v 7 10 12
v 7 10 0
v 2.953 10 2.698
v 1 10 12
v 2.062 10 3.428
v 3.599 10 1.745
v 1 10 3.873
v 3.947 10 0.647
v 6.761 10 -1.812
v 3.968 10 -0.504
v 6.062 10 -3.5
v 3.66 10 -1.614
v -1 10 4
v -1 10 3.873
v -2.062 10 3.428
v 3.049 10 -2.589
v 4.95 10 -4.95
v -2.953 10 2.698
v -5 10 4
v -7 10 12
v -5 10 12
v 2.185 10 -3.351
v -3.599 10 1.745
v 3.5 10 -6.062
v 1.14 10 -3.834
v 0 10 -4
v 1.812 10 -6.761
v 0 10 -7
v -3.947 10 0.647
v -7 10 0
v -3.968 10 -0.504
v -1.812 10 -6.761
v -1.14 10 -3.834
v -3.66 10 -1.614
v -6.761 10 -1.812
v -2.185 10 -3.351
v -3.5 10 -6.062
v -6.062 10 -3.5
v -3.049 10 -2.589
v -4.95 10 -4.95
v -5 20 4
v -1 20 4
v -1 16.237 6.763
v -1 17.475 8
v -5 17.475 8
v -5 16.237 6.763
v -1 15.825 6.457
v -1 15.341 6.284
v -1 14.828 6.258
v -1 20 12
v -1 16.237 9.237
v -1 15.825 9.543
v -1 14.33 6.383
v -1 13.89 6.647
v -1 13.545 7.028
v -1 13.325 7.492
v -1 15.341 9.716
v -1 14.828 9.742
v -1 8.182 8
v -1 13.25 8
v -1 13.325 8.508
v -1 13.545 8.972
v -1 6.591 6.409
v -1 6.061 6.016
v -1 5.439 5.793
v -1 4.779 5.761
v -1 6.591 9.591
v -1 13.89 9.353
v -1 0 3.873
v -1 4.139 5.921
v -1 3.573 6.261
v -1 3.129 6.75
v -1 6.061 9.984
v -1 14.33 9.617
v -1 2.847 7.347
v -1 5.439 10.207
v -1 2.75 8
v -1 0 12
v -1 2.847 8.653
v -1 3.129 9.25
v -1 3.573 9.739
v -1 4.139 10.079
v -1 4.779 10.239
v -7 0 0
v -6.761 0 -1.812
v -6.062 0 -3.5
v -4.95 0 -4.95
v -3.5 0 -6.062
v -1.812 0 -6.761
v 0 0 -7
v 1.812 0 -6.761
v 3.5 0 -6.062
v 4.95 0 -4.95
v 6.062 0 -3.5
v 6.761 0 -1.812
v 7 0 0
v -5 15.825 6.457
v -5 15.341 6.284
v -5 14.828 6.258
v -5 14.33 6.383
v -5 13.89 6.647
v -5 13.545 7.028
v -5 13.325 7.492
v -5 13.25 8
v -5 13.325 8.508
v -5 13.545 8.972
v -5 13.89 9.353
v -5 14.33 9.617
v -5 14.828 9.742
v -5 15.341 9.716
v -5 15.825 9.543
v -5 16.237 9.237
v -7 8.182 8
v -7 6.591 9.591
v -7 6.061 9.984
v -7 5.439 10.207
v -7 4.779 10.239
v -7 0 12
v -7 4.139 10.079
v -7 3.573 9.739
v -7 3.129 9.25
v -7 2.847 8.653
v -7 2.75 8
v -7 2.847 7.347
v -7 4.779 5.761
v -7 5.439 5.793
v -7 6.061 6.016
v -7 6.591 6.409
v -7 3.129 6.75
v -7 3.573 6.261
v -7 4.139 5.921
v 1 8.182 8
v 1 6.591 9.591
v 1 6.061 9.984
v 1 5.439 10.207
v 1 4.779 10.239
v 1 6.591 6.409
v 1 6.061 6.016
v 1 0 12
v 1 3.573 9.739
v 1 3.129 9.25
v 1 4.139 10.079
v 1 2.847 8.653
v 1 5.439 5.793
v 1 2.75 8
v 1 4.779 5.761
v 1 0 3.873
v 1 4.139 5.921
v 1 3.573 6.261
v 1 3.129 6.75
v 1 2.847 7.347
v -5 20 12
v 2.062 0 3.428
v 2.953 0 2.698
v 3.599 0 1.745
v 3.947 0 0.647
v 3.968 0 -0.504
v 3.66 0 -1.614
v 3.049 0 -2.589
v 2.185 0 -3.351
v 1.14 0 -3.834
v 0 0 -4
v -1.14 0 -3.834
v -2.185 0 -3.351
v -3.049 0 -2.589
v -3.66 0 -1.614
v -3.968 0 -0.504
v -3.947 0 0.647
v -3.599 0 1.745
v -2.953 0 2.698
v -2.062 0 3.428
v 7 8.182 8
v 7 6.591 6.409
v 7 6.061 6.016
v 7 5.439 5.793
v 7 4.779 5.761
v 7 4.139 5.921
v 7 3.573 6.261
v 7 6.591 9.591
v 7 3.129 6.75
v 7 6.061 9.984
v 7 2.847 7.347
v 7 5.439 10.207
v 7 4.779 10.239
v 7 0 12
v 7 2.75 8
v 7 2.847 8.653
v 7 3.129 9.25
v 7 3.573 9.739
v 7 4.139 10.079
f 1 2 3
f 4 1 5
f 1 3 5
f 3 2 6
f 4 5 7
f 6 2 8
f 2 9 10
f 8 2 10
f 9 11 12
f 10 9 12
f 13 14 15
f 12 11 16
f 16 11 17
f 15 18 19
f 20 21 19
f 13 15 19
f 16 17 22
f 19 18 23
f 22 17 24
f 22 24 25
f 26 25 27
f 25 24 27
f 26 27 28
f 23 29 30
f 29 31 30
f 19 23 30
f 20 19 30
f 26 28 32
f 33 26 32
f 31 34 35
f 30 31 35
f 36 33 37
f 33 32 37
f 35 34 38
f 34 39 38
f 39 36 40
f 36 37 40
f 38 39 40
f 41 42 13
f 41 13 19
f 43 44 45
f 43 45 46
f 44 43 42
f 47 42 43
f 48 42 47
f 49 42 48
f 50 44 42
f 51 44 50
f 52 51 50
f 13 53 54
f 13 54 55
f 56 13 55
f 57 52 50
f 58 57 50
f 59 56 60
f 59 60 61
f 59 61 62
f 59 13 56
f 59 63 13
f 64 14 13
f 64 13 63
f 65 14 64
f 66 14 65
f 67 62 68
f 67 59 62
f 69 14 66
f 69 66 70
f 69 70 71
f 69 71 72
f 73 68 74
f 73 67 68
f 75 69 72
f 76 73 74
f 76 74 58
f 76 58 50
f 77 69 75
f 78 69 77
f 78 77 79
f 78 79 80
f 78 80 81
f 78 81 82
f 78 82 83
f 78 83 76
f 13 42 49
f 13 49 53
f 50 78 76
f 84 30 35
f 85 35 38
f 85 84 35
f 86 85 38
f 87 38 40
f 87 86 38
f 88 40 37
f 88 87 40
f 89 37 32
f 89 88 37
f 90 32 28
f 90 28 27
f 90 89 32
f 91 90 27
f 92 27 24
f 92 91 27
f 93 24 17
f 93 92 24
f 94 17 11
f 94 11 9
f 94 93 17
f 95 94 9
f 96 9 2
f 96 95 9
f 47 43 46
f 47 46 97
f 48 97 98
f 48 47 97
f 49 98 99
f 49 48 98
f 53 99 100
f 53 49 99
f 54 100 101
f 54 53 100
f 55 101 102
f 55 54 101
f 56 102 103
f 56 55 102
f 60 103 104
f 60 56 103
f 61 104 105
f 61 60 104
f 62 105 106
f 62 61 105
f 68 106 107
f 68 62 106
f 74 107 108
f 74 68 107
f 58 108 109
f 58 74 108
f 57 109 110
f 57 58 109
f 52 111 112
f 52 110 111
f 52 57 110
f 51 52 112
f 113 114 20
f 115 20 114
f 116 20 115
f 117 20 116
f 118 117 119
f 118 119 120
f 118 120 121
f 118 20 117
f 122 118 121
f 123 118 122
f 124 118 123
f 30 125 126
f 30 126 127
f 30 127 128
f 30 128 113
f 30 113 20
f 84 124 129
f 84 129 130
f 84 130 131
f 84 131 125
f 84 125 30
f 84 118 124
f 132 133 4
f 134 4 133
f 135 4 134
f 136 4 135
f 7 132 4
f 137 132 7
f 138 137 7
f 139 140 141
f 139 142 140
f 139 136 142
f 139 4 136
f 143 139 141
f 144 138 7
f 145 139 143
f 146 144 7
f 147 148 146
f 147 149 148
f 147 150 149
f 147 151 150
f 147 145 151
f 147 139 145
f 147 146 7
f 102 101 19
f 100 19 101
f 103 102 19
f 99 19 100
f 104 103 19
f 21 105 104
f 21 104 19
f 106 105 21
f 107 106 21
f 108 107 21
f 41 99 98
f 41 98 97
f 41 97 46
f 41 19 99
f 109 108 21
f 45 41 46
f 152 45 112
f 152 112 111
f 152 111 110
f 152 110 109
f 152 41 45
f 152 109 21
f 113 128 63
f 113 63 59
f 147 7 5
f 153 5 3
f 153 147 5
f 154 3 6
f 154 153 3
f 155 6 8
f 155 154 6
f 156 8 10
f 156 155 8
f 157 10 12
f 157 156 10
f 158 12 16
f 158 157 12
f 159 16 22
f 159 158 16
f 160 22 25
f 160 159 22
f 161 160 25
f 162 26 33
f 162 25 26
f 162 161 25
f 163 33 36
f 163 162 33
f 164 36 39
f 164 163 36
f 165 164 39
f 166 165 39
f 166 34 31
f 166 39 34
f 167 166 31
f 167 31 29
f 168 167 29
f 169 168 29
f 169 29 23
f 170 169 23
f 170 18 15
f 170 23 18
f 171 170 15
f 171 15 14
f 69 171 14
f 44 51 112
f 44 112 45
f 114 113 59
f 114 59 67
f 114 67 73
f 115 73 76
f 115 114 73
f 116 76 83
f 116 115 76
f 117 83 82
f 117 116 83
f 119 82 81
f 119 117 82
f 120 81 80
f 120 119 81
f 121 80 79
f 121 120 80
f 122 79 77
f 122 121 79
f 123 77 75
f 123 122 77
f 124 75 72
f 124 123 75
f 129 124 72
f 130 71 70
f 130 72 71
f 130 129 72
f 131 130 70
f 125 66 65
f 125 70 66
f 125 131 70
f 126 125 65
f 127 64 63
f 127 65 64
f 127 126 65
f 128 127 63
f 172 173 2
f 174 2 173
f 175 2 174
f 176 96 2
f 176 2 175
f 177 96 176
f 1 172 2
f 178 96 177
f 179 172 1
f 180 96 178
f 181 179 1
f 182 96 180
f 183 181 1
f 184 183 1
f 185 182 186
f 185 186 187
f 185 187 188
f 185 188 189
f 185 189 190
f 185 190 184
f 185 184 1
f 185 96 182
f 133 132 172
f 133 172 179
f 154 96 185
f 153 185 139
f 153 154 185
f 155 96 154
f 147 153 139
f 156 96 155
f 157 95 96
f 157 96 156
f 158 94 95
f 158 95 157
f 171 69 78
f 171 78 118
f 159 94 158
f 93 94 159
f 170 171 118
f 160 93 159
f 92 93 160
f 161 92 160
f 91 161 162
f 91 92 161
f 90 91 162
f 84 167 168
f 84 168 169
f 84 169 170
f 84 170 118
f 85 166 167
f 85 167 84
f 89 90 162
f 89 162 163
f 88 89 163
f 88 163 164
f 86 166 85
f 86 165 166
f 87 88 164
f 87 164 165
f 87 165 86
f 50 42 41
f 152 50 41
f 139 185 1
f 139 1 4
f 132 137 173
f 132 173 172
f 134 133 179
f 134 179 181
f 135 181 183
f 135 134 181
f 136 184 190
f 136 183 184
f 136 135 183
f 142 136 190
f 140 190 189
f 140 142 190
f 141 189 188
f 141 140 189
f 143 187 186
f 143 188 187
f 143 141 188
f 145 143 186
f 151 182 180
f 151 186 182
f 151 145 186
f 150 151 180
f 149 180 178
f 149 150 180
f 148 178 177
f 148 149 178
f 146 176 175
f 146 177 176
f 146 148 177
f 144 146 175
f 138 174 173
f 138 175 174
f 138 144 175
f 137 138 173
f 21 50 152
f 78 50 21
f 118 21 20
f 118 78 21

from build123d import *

# Parameters (mm, degrees)
BOSS_EXTRUDE1_DEPTH = 20
CUT_EXTRUDE1_DEPTH  = 28.202941017
CUT_EXTRUDE2_DEPTH  = 10
CUT_EXTRUDE3_DEPTH  = 10
SKETCH5_W           = 8
SKETCH5_H           = 10
CUT_EXTRUDE4_DEPTH  = 2


with BuildPart() as part:
    # Sketch1 → Boss-Extrude1 (new body)
    with BuildSketch(Plane(origin=(0, 0, 0), x_dir=(1, 0, 0), z_dir=(0, 1, 0))):
        with BuildLine():
            Line((-7, -12), (-7, 0))
            ThreePointArc((-7, 0), (0, 7), (7, 0))
            Line((7, 0), (7, -12))
            Line((7, -12), (1, -12))
            Line((1, -12), (1, -3.872983346))
            ThreePointArc((1, -3.872983346), (0, 4), (-1, -3.872983346))
            Line((-1, -3.872983346), (-1, -12))
            Line((-1, -12), (-7, -12))
        make_face()
    extrude(amount=BOSS_EXTRUDE1_DEPTH)

    # Sketch2 → Cut-Extrude1 (cut, through all)
    with BuildSketch(Plane.ZY.offset(7)):
        with BuildLine():
            Line((6.409009742, 6.590990258), (8, 8.181980515))
            Line((8, 8.181980515), (9.590990258, 6.590990258))
            ThreePointArc((9.590990258, 6.590990258), (8, 2.75), (6.409009742, 6.590990258))
        make_face()
    extrude(amount=-CUT_EXTRUDE1_DEPTH, mode=Mode.SUBTRACT)

    # Sketch3 → Cut-Extrude2 (cut)
    with BuildSketch(Plane(origin=(0, 20, 0), x_dir=(1, 0, 0), z_dir=(0, 1, 0))):
        Polygon((1, -4), (-7, -4), (-7, 7), (7, 7), (7, 0), (7, -12), (1, -12), align=None)
    extrude(amount=-CUT_EXTRUDE2_DEPTH, mode=Mode.SUBTRACT)

    # Sketch4 → Cut-Extrude3 (cut)
    with BuildSketch(Plane(origin=(-1, 0, 0), x_dir=(0, 0, -1), z_dir=(1, 0, 0))):
        with BuildLine():
            Line((-9.237436867, 16.237436867), (-8, 17.474873734))
            Line((-8, 17.474873734), (-6.762563133, 16.237436867))
            ThreePointArc((-6.762563133, 16.237436867), (-8, 13.25), (-9.237436867, 16.237436867))
        make_face()
    extrude(amount=-CUT_EXTRUDE3_DEPTH, mode=Mode.SUBTRACT)

    # Sketch5 → Cut-Extrude4 (cut)
    with BuildSketch(Plane.ZY.offset(7)):
        with Locations((8, 15)):
            Rectangle(SKETCH5_W, SKETCH5_H)
    extrude(amount=-CUT_EXTRUDE4_DEPTH, mode=Mode.SUBTRACT)


solid = part.part
